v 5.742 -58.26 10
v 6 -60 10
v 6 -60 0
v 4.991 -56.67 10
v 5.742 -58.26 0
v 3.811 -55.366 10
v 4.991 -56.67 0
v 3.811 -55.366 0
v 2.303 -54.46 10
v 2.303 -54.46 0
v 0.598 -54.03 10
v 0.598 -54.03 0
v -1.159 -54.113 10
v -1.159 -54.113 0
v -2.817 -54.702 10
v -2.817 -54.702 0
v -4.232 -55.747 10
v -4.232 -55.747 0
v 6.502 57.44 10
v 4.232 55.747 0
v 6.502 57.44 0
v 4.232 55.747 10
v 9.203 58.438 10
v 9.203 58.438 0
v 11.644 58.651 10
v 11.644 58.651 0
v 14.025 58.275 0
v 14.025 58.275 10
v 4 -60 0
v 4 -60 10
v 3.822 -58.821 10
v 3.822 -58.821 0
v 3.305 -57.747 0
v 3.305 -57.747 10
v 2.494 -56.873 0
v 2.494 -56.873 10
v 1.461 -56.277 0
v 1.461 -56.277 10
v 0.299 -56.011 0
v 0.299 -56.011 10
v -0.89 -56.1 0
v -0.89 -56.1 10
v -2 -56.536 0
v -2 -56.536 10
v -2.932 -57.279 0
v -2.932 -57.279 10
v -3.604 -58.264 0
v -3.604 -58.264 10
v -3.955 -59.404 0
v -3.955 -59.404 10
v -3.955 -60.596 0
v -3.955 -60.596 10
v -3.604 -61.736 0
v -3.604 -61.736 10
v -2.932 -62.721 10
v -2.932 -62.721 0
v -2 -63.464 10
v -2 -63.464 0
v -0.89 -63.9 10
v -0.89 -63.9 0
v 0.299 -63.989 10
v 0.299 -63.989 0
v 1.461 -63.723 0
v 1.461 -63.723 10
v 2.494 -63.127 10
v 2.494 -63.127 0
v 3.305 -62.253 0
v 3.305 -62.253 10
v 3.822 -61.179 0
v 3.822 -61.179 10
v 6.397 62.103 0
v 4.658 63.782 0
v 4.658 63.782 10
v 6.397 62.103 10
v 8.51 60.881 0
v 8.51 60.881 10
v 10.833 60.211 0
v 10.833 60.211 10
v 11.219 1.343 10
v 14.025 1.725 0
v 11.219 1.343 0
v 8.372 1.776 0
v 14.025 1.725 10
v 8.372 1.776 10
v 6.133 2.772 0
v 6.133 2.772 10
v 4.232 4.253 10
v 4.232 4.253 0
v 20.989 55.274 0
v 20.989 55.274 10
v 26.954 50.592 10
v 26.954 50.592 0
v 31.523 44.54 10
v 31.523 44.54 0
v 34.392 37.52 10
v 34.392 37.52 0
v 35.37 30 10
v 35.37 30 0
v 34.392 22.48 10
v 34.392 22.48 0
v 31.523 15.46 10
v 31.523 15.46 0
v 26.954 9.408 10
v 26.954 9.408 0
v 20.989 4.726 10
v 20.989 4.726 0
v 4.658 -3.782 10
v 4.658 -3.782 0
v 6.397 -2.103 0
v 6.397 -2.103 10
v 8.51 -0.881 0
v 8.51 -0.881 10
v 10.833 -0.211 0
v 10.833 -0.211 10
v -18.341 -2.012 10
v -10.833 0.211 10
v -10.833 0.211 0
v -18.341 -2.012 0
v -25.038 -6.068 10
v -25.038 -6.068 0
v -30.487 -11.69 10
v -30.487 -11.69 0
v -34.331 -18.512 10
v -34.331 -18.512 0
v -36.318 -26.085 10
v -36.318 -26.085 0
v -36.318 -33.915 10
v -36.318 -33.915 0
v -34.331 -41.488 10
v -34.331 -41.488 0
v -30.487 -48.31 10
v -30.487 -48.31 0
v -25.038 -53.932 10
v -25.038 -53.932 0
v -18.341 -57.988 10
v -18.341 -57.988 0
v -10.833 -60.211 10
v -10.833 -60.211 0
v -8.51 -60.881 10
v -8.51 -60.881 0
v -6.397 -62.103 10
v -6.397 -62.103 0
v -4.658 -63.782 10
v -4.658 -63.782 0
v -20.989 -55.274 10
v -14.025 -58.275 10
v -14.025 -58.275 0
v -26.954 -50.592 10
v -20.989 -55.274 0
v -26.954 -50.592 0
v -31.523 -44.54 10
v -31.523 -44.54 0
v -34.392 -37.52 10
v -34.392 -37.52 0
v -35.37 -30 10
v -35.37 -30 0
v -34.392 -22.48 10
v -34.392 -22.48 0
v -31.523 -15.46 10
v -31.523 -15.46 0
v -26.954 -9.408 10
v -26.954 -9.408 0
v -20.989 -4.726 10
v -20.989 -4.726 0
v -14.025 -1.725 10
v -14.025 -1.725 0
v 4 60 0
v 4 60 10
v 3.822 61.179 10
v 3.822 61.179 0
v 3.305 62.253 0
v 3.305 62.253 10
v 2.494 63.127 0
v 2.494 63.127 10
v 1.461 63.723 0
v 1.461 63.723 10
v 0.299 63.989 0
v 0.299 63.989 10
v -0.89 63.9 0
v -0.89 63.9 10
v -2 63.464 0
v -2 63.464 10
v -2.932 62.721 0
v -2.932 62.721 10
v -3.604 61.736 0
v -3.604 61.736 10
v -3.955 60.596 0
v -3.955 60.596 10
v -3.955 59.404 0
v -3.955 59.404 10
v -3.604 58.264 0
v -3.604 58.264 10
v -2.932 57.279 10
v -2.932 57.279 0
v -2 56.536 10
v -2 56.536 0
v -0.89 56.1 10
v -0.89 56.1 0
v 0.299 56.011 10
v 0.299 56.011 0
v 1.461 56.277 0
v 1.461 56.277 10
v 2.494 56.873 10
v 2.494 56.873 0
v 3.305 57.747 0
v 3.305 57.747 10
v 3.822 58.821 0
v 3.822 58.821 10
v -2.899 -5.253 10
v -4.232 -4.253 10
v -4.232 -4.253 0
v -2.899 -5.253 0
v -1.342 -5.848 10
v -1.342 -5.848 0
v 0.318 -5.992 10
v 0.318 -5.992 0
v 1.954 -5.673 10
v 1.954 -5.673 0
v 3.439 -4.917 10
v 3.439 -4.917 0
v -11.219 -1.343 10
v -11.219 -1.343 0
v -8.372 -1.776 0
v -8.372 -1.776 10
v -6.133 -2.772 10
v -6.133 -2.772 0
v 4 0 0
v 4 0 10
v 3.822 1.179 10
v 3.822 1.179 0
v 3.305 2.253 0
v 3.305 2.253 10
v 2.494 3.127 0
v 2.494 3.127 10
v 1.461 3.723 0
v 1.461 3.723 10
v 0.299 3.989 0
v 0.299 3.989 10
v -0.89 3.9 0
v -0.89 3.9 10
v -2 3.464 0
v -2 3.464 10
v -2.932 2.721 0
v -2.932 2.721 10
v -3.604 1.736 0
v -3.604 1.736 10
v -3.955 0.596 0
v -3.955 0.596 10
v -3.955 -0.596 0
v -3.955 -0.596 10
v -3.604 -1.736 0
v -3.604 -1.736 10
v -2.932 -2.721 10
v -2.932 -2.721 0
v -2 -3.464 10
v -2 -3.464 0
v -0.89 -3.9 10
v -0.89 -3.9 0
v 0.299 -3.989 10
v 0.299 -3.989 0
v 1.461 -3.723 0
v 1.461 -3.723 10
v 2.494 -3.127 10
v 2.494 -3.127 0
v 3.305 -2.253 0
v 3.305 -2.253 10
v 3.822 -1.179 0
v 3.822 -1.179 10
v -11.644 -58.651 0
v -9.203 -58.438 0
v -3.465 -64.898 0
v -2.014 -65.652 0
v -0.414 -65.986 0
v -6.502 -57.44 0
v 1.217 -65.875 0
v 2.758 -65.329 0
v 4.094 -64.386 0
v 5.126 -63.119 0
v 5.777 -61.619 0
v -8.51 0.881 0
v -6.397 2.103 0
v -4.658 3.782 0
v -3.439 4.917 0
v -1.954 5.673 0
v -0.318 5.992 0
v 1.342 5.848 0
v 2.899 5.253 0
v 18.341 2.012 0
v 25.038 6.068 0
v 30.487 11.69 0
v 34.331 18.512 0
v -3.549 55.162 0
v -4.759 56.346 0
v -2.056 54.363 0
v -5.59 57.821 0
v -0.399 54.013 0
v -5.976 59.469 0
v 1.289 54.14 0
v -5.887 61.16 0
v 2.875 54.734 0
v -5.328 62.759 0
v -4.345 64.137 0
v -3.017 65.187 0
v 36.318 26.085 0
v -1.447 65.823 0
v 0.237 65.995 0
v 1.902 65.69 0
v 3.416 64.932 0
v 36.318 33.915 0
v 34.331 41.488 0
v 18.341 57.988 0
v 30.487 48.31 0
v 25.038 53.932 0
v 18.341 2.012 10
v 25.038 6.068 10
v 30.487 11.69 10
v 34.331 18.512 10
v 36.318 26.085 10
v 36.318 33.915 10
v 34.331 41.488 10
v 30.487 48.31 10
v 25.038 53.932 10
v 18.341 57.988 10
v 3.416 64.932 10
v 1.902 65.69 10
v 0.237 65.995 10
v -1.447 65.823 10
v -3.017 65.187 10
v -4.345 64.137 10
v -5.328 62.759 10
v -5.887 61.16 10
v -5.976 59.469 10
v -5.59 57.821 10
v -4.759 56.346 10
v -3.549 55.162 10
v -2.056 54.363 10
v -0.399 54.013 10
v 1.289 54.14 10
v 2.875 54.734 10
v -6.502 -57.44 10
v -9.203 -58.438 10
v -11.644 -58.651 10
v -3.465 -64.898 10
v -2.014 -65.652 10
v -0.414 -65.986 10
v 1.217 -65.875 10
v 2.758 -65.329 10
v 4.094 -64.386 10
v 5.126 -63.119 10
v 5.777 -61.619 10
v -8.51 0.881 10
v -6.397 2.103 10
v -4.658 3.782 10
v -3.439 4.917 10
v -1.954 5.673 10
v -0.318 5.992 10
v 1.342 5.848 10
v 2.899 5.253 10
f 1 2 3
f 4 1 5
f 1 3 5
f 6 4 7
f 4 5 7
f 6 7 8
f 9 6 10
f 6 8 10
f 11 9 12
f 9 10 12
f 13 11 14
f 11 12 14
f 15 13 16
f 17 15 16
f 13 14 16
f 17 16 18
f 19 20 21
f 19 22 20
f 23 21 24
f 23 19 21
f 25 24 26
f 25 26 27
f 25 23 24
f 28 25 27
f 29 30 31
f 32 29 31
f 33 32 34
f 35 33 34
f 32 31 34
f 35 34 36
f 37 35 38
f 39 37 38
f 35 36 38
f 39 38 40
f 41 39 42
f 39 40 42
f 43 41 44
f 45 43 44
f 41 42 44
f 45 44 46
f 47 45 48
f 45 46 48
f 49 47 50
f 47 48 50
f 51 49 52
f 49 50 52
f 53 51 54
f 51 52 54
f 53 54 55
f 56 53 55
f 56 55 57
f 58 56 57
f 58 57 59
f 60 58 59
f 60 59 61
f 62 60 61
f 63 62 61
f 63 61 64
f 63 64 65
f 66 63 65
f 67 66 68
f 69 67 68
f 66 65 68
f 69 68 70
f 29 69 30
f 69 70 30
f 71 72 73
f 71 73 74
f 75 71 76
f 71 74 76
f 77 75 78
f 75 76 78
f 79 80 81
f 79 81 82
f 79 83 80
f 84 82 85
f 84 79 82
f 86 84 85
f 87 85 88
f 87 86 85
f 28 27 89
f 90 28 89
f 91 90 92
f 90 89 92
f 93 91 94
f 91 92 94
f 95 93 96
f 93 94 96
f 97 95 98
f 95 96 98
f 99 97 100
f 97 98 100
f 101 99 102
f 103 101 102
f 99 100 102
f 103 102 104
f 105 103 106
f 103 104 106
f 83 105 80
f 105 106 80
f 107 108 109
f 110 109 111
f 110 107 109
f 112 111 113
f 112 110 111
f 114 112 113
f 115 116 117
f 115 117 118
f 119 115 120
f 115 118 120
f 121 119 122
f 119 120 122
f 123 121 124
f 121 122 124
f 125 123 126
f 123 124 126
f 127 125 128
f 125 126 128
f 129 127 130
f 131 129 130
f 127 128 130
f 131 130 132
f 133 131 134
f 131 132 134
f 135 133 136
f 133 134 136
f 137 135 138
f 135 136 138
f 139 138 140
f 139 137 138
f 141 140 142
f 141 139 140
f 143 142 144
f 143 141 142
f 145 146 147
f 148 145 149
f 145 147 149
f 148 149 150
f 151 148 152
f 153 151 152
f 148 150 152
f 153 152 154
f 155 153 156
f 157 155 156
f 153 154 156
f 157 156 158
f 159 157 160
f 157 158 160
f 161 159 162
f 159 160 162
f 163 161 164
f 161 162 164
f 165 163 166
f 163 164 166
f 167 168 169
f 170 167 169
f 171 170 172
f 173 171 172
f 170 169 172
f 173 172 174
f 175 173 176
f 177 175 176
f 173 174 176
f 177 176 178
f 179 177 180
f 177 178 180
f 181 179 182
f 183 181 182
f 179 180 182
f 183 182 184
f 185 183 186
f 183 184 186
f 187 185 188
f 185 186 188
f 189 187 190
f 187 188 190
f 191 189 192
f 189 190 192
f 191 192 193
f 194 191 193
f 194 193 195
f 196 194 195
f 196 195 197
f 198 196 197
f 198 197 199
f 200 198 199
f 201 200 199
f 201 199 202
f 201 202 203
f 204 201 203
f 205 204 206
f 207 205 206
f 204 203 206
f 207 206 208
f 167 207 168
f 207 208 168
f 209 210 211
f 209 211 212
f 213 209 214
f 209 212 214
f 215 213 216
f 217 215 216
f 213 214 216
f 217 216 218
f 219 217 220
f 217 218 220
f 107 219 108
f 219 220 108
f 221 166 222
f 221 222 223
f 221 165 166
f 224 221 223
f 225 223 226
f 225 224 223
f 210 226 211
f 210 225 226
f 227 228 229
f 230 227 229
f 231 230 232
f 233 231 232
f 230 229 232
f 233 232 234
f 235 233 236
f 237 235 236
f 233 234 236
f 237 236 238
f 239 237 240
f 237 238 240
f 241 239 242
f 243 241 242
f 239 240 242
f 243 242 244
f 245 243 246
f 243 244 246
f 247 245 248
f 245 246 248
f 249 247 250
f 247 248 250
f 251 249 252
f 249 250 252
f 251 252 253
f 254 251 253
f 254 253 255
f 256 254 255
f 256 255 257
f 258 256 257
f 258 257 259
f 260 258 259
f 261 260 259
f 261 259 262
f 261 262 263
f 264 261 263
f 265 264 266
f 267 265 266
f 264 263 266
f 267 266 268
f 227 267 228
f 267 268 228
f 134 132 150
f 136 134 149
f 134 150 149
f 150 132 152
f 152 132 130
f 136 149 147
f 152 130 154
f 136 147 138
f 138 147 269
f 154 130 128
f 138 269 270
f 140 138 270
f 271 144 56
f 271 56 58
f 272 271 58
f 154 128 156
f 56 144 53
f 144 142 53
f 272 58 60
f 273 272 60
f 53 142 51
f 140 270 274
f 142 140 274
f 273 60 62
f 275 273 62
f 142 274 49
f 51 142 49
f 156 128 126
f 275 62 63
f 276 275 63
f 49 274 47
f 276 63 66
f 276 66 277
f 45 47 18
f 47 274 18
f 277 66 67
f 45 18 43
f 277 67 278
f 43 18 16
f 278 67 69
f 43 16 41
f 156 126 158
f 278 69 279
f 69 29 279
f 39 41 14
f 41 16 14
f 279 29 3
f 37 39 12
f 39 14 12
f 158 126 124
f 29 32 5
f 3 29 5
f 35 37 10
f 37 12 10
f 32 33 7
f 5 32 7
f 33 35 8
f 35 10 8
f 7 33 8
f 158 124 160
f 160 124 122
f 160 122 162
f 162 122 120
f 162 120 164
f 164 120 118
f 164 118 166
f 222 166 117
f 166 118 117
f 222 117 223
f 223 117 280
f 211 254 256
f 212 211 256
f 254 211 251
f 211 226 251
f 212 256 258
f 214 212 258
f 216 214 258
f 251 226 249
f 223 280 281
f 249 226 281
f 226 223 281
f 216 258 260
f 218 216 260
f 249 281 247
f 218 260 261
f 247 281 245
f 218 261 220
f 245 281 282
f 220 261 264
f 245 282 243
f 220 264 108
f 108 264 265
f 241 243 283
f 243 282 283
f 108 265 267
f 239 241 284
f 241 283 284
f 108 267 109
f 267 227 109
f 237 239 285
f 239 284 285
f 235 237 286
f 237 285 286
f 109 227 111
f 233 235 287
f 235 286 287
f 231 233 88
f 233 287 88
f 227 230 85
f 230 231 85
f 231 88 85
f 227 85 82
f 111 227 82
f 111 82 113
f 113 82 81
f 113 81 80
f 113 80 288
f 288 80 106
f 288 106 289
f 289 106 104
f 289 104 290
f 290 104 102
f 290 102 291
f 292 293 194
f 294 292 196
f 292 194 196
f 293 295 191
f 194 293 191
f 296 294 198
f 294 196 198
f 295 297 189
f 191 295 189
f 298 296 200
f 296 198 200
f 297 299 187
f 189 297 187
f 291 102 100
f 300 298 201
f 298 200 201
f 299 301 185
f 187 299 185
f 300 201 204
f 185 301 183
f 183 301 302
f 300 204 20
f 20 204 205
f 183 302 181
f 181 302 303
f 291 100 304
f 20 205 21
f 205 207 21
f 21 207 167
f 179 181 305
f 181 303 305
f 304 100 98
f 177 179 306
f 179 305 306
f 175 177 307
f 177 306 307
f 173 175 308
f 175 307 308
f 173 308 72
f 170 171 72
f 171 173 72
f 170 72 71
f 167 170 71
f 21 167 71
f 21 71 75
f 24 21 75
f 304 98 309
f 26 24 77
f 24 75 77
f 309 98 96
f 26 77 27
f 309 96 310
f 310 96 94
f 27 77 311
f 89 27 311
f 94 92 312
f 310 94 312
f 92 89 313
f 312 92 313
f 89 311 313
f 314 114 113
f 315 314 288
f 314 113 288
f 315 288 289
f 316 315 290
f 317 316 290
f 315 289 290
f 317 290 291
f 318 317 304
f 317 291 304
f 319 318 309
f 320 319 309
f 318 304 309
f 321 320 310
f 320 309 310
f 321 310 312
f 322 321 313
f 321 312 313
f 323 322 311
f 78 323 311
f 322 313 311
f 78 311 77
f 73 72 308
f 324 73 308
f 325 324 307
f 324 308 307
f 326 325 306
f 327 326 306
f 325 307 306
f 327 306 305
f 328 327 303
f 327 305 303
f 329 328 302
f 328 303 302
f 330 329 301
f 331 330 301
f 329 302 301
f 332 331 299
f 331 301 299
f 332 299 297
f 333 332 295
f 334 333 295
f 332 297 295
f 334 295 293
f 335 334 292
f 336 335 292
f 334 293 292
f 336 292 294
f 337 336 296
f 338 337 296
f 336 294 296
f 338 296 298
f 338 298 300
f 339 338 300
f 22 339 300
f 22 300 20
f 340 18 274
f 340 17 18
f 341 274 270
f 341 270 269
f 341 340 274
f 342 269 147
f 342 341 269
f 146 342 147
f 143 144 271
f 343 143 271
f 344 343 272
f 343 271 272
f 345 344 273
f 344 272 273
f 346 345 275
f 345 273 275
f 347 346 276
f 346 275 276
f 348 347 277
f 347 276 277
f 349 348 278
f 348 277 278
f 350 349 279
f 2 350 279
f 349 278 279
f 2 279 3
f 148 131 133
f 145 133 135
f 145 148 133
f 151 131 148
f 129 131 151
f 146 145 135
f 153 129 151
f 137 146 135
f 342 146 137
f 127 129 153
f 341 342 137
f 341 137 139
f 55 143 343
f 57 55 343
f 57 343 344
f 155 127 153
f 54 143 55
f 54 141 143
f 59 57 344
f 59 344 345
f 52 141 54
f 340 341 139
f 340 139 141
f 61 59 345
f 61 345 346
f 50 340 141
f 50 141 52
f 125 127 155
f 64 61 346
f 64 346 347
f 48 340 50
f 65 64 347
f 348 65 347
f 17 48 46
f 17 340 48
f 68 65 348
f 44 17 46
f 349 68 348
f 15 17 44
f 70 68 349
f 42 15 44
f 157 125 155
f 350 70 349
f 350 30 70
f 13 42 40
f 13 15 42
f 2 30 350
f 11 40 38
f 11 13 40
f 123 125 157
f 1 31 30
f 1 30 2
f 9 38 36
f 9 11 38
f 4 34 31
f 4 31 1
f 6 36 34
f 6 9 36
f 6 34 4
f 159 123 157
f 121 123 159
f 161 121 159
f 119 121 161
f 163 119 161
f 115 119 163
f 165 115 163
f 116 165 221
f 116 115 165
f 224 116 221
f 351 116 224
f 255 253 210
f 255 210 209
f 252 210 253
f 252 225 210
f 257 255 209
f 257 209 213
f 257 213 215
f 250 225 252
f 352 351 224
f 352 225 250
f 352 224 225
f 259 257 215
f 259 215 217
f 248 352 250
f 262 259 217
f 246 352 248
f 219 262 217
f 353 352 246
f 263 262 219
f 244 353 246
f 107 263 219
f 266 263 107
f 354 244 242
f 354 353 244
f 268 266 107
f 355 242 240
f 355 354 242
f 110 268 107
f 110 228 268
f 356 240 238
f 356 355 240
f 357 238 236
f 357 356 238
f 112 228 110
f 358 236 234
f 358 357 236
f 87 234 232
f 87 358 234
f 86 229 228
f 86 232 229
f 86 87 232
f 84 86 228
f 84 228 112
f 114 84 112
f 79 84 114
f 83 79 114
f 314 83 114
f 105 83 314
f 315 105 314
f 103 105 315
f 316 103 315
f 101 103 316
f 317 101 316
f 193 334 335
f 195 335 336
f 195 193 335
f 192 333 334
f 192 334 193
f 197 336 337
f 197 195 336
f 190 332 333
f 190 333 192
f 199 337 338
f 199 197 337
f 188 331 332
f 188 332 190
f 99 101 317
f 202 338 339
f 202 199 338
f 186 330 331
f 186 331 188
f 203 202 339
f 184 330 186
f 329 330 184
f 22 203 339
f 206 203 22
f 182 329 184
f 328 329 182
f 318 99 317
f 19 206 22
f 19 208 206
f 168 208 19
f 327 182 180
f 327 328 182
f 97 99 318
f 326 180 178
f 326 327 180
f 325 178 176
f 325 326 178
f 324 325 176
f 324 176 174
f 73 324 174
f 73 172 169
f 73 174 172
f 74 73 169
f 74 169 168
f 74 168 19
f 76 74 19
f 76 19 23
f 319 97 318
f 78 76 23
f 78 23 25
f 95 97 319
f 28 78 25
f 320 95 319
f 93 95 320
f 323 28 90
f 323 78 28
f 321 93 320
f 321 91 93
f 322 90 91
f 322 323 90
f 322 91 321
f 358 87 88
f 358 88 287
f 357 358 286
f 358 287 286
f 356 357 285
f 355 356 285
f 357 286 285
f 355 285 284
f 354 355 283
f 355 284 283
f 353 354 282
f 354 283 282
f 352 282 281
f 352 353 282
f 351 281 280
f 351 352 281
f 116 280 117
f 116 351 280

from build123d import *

# Parameters (mm, degrees)
F1_DEPTH = 10
F2_R     = 10
F3_R     = 4
F4_DEPTH = 10


with BuildPart() as f1:
    # F0 (on Top) → F1 (new body)
    with BuildSketch(Plane.XY):
        with BuildLine():
            ThreePointArc((5.9699246226, 59.4), (5.9924764387, 59.6996233496), (6, 60))
            ThreePointArc((6, 60), (5.9924764387, 60.3003766504), (5.9699246226, 60.6))
            ThreePointArc((5.9699246226, 60.6), (-6, 60), (5.9699246226, 59.4))
        make_face()
        with BuildLine():
            ThreePointArc((5.9699246226, 60.6), (5.9924764387, 60.3003766504), (6, 60))
            ThreePointArc((6, 60), (5.9924764387, 59.6996233496), (5.9699246226, 59.4))
            ThreePointArc((5.9699246226, 59.4), (35.3699246226, 30), (5.9699246226, 0.6))
            ThreePointArc((5.9699246226, 0.6), (5.9924764387, 0.3003766504), (6, 0))
            ThreePointArc((6, 0), (5.9924764387, -0.3003766504), (5.9699246226, -0.6))
            ThreePointArc((5.9699246226, -0.6), (36.5699246226, 30), (5.9699246226, 60.6))
        make_face()
        with BuildLine():
            ThreePointArc((-5.9699246226, -0.6), (0, -6), (5.9699246226, -0.6))
            ThreePointArc((5.9699246226, -0.6), (5.9924764387, -0.3003766504), (6, 0))
            ThreePointArc((6, 0), (5.9924764387, 0.3003766504), (5.9699246226, 0.6))
            ThreePointArc((5.9699246226, 0.6), (0, 6), (-5.9699246226, 0.6))
            ThreePointArc((-5.9699246226, 0.6), (-6, 0), (-5.9699246226, -0.6))
        make_face()
        with BuildLine():
            ThreePointArc((-5.9699246226, -59.4), (-35.3699246226, -30), (-5.9699246226, -0.6))
            ThreePointArc((-5.9699246226, -0.6), (-6, 0), (-5.9699246226, 0.6))
            ThreePointArc((-5.9699246226, 0.6), (-36.5699246226, -30), (-5.9699246226, -60.6))
            ThreePointArc((-5.9699246226, -60.6), (-6, -60), (-5.9699246226, -59.4))
        make_face()
        with BuildLine():
            ThreePointArc((6, -60), (0.3003766504, -54.0075235613), (-5.9699246226, -59.4))
            ThreePointArc((-5.9699246226, -59.4), (-6, -60), (-5.9699246226, -60.6))
            ThreePointArc((-5.9699246226, -60.6), (0.3003766504, -65.9924764387), (6, -60))
        make_face()
    extrude(amount=F1_DEPTH)

    # F2
    f2_edges = [f1.edges().sort_by_distance(p)[0] for p in [
        (5.969925, -0.6, 5),
        (5.969925, 59.4, 5),
        (5.969925, 0.6, 5),
        (5.969925, 60.6, 5),
        (-5.969925, -60.6, 5),
        (-5.969925, -0.6, 5),
        (-5.969925, -59.4, 5),
        (-5.969925, 0.6, 5),
    ]]
    fillet(f2_edges, radius=F2_R)

    # F3 (on face) → F4 (cut, through all)
    with BuildSketch(Plane.XY.offset(10)):
        Circle(F3_R)
        with Locations((0, 60)):
            Circle(F3_R)
        with Locations((0, -60)):
            Circle(F3_R)
    extrude(amount=-F4_DEPTH, mode=Mode.SUBTRACT)


solid = f1.part
